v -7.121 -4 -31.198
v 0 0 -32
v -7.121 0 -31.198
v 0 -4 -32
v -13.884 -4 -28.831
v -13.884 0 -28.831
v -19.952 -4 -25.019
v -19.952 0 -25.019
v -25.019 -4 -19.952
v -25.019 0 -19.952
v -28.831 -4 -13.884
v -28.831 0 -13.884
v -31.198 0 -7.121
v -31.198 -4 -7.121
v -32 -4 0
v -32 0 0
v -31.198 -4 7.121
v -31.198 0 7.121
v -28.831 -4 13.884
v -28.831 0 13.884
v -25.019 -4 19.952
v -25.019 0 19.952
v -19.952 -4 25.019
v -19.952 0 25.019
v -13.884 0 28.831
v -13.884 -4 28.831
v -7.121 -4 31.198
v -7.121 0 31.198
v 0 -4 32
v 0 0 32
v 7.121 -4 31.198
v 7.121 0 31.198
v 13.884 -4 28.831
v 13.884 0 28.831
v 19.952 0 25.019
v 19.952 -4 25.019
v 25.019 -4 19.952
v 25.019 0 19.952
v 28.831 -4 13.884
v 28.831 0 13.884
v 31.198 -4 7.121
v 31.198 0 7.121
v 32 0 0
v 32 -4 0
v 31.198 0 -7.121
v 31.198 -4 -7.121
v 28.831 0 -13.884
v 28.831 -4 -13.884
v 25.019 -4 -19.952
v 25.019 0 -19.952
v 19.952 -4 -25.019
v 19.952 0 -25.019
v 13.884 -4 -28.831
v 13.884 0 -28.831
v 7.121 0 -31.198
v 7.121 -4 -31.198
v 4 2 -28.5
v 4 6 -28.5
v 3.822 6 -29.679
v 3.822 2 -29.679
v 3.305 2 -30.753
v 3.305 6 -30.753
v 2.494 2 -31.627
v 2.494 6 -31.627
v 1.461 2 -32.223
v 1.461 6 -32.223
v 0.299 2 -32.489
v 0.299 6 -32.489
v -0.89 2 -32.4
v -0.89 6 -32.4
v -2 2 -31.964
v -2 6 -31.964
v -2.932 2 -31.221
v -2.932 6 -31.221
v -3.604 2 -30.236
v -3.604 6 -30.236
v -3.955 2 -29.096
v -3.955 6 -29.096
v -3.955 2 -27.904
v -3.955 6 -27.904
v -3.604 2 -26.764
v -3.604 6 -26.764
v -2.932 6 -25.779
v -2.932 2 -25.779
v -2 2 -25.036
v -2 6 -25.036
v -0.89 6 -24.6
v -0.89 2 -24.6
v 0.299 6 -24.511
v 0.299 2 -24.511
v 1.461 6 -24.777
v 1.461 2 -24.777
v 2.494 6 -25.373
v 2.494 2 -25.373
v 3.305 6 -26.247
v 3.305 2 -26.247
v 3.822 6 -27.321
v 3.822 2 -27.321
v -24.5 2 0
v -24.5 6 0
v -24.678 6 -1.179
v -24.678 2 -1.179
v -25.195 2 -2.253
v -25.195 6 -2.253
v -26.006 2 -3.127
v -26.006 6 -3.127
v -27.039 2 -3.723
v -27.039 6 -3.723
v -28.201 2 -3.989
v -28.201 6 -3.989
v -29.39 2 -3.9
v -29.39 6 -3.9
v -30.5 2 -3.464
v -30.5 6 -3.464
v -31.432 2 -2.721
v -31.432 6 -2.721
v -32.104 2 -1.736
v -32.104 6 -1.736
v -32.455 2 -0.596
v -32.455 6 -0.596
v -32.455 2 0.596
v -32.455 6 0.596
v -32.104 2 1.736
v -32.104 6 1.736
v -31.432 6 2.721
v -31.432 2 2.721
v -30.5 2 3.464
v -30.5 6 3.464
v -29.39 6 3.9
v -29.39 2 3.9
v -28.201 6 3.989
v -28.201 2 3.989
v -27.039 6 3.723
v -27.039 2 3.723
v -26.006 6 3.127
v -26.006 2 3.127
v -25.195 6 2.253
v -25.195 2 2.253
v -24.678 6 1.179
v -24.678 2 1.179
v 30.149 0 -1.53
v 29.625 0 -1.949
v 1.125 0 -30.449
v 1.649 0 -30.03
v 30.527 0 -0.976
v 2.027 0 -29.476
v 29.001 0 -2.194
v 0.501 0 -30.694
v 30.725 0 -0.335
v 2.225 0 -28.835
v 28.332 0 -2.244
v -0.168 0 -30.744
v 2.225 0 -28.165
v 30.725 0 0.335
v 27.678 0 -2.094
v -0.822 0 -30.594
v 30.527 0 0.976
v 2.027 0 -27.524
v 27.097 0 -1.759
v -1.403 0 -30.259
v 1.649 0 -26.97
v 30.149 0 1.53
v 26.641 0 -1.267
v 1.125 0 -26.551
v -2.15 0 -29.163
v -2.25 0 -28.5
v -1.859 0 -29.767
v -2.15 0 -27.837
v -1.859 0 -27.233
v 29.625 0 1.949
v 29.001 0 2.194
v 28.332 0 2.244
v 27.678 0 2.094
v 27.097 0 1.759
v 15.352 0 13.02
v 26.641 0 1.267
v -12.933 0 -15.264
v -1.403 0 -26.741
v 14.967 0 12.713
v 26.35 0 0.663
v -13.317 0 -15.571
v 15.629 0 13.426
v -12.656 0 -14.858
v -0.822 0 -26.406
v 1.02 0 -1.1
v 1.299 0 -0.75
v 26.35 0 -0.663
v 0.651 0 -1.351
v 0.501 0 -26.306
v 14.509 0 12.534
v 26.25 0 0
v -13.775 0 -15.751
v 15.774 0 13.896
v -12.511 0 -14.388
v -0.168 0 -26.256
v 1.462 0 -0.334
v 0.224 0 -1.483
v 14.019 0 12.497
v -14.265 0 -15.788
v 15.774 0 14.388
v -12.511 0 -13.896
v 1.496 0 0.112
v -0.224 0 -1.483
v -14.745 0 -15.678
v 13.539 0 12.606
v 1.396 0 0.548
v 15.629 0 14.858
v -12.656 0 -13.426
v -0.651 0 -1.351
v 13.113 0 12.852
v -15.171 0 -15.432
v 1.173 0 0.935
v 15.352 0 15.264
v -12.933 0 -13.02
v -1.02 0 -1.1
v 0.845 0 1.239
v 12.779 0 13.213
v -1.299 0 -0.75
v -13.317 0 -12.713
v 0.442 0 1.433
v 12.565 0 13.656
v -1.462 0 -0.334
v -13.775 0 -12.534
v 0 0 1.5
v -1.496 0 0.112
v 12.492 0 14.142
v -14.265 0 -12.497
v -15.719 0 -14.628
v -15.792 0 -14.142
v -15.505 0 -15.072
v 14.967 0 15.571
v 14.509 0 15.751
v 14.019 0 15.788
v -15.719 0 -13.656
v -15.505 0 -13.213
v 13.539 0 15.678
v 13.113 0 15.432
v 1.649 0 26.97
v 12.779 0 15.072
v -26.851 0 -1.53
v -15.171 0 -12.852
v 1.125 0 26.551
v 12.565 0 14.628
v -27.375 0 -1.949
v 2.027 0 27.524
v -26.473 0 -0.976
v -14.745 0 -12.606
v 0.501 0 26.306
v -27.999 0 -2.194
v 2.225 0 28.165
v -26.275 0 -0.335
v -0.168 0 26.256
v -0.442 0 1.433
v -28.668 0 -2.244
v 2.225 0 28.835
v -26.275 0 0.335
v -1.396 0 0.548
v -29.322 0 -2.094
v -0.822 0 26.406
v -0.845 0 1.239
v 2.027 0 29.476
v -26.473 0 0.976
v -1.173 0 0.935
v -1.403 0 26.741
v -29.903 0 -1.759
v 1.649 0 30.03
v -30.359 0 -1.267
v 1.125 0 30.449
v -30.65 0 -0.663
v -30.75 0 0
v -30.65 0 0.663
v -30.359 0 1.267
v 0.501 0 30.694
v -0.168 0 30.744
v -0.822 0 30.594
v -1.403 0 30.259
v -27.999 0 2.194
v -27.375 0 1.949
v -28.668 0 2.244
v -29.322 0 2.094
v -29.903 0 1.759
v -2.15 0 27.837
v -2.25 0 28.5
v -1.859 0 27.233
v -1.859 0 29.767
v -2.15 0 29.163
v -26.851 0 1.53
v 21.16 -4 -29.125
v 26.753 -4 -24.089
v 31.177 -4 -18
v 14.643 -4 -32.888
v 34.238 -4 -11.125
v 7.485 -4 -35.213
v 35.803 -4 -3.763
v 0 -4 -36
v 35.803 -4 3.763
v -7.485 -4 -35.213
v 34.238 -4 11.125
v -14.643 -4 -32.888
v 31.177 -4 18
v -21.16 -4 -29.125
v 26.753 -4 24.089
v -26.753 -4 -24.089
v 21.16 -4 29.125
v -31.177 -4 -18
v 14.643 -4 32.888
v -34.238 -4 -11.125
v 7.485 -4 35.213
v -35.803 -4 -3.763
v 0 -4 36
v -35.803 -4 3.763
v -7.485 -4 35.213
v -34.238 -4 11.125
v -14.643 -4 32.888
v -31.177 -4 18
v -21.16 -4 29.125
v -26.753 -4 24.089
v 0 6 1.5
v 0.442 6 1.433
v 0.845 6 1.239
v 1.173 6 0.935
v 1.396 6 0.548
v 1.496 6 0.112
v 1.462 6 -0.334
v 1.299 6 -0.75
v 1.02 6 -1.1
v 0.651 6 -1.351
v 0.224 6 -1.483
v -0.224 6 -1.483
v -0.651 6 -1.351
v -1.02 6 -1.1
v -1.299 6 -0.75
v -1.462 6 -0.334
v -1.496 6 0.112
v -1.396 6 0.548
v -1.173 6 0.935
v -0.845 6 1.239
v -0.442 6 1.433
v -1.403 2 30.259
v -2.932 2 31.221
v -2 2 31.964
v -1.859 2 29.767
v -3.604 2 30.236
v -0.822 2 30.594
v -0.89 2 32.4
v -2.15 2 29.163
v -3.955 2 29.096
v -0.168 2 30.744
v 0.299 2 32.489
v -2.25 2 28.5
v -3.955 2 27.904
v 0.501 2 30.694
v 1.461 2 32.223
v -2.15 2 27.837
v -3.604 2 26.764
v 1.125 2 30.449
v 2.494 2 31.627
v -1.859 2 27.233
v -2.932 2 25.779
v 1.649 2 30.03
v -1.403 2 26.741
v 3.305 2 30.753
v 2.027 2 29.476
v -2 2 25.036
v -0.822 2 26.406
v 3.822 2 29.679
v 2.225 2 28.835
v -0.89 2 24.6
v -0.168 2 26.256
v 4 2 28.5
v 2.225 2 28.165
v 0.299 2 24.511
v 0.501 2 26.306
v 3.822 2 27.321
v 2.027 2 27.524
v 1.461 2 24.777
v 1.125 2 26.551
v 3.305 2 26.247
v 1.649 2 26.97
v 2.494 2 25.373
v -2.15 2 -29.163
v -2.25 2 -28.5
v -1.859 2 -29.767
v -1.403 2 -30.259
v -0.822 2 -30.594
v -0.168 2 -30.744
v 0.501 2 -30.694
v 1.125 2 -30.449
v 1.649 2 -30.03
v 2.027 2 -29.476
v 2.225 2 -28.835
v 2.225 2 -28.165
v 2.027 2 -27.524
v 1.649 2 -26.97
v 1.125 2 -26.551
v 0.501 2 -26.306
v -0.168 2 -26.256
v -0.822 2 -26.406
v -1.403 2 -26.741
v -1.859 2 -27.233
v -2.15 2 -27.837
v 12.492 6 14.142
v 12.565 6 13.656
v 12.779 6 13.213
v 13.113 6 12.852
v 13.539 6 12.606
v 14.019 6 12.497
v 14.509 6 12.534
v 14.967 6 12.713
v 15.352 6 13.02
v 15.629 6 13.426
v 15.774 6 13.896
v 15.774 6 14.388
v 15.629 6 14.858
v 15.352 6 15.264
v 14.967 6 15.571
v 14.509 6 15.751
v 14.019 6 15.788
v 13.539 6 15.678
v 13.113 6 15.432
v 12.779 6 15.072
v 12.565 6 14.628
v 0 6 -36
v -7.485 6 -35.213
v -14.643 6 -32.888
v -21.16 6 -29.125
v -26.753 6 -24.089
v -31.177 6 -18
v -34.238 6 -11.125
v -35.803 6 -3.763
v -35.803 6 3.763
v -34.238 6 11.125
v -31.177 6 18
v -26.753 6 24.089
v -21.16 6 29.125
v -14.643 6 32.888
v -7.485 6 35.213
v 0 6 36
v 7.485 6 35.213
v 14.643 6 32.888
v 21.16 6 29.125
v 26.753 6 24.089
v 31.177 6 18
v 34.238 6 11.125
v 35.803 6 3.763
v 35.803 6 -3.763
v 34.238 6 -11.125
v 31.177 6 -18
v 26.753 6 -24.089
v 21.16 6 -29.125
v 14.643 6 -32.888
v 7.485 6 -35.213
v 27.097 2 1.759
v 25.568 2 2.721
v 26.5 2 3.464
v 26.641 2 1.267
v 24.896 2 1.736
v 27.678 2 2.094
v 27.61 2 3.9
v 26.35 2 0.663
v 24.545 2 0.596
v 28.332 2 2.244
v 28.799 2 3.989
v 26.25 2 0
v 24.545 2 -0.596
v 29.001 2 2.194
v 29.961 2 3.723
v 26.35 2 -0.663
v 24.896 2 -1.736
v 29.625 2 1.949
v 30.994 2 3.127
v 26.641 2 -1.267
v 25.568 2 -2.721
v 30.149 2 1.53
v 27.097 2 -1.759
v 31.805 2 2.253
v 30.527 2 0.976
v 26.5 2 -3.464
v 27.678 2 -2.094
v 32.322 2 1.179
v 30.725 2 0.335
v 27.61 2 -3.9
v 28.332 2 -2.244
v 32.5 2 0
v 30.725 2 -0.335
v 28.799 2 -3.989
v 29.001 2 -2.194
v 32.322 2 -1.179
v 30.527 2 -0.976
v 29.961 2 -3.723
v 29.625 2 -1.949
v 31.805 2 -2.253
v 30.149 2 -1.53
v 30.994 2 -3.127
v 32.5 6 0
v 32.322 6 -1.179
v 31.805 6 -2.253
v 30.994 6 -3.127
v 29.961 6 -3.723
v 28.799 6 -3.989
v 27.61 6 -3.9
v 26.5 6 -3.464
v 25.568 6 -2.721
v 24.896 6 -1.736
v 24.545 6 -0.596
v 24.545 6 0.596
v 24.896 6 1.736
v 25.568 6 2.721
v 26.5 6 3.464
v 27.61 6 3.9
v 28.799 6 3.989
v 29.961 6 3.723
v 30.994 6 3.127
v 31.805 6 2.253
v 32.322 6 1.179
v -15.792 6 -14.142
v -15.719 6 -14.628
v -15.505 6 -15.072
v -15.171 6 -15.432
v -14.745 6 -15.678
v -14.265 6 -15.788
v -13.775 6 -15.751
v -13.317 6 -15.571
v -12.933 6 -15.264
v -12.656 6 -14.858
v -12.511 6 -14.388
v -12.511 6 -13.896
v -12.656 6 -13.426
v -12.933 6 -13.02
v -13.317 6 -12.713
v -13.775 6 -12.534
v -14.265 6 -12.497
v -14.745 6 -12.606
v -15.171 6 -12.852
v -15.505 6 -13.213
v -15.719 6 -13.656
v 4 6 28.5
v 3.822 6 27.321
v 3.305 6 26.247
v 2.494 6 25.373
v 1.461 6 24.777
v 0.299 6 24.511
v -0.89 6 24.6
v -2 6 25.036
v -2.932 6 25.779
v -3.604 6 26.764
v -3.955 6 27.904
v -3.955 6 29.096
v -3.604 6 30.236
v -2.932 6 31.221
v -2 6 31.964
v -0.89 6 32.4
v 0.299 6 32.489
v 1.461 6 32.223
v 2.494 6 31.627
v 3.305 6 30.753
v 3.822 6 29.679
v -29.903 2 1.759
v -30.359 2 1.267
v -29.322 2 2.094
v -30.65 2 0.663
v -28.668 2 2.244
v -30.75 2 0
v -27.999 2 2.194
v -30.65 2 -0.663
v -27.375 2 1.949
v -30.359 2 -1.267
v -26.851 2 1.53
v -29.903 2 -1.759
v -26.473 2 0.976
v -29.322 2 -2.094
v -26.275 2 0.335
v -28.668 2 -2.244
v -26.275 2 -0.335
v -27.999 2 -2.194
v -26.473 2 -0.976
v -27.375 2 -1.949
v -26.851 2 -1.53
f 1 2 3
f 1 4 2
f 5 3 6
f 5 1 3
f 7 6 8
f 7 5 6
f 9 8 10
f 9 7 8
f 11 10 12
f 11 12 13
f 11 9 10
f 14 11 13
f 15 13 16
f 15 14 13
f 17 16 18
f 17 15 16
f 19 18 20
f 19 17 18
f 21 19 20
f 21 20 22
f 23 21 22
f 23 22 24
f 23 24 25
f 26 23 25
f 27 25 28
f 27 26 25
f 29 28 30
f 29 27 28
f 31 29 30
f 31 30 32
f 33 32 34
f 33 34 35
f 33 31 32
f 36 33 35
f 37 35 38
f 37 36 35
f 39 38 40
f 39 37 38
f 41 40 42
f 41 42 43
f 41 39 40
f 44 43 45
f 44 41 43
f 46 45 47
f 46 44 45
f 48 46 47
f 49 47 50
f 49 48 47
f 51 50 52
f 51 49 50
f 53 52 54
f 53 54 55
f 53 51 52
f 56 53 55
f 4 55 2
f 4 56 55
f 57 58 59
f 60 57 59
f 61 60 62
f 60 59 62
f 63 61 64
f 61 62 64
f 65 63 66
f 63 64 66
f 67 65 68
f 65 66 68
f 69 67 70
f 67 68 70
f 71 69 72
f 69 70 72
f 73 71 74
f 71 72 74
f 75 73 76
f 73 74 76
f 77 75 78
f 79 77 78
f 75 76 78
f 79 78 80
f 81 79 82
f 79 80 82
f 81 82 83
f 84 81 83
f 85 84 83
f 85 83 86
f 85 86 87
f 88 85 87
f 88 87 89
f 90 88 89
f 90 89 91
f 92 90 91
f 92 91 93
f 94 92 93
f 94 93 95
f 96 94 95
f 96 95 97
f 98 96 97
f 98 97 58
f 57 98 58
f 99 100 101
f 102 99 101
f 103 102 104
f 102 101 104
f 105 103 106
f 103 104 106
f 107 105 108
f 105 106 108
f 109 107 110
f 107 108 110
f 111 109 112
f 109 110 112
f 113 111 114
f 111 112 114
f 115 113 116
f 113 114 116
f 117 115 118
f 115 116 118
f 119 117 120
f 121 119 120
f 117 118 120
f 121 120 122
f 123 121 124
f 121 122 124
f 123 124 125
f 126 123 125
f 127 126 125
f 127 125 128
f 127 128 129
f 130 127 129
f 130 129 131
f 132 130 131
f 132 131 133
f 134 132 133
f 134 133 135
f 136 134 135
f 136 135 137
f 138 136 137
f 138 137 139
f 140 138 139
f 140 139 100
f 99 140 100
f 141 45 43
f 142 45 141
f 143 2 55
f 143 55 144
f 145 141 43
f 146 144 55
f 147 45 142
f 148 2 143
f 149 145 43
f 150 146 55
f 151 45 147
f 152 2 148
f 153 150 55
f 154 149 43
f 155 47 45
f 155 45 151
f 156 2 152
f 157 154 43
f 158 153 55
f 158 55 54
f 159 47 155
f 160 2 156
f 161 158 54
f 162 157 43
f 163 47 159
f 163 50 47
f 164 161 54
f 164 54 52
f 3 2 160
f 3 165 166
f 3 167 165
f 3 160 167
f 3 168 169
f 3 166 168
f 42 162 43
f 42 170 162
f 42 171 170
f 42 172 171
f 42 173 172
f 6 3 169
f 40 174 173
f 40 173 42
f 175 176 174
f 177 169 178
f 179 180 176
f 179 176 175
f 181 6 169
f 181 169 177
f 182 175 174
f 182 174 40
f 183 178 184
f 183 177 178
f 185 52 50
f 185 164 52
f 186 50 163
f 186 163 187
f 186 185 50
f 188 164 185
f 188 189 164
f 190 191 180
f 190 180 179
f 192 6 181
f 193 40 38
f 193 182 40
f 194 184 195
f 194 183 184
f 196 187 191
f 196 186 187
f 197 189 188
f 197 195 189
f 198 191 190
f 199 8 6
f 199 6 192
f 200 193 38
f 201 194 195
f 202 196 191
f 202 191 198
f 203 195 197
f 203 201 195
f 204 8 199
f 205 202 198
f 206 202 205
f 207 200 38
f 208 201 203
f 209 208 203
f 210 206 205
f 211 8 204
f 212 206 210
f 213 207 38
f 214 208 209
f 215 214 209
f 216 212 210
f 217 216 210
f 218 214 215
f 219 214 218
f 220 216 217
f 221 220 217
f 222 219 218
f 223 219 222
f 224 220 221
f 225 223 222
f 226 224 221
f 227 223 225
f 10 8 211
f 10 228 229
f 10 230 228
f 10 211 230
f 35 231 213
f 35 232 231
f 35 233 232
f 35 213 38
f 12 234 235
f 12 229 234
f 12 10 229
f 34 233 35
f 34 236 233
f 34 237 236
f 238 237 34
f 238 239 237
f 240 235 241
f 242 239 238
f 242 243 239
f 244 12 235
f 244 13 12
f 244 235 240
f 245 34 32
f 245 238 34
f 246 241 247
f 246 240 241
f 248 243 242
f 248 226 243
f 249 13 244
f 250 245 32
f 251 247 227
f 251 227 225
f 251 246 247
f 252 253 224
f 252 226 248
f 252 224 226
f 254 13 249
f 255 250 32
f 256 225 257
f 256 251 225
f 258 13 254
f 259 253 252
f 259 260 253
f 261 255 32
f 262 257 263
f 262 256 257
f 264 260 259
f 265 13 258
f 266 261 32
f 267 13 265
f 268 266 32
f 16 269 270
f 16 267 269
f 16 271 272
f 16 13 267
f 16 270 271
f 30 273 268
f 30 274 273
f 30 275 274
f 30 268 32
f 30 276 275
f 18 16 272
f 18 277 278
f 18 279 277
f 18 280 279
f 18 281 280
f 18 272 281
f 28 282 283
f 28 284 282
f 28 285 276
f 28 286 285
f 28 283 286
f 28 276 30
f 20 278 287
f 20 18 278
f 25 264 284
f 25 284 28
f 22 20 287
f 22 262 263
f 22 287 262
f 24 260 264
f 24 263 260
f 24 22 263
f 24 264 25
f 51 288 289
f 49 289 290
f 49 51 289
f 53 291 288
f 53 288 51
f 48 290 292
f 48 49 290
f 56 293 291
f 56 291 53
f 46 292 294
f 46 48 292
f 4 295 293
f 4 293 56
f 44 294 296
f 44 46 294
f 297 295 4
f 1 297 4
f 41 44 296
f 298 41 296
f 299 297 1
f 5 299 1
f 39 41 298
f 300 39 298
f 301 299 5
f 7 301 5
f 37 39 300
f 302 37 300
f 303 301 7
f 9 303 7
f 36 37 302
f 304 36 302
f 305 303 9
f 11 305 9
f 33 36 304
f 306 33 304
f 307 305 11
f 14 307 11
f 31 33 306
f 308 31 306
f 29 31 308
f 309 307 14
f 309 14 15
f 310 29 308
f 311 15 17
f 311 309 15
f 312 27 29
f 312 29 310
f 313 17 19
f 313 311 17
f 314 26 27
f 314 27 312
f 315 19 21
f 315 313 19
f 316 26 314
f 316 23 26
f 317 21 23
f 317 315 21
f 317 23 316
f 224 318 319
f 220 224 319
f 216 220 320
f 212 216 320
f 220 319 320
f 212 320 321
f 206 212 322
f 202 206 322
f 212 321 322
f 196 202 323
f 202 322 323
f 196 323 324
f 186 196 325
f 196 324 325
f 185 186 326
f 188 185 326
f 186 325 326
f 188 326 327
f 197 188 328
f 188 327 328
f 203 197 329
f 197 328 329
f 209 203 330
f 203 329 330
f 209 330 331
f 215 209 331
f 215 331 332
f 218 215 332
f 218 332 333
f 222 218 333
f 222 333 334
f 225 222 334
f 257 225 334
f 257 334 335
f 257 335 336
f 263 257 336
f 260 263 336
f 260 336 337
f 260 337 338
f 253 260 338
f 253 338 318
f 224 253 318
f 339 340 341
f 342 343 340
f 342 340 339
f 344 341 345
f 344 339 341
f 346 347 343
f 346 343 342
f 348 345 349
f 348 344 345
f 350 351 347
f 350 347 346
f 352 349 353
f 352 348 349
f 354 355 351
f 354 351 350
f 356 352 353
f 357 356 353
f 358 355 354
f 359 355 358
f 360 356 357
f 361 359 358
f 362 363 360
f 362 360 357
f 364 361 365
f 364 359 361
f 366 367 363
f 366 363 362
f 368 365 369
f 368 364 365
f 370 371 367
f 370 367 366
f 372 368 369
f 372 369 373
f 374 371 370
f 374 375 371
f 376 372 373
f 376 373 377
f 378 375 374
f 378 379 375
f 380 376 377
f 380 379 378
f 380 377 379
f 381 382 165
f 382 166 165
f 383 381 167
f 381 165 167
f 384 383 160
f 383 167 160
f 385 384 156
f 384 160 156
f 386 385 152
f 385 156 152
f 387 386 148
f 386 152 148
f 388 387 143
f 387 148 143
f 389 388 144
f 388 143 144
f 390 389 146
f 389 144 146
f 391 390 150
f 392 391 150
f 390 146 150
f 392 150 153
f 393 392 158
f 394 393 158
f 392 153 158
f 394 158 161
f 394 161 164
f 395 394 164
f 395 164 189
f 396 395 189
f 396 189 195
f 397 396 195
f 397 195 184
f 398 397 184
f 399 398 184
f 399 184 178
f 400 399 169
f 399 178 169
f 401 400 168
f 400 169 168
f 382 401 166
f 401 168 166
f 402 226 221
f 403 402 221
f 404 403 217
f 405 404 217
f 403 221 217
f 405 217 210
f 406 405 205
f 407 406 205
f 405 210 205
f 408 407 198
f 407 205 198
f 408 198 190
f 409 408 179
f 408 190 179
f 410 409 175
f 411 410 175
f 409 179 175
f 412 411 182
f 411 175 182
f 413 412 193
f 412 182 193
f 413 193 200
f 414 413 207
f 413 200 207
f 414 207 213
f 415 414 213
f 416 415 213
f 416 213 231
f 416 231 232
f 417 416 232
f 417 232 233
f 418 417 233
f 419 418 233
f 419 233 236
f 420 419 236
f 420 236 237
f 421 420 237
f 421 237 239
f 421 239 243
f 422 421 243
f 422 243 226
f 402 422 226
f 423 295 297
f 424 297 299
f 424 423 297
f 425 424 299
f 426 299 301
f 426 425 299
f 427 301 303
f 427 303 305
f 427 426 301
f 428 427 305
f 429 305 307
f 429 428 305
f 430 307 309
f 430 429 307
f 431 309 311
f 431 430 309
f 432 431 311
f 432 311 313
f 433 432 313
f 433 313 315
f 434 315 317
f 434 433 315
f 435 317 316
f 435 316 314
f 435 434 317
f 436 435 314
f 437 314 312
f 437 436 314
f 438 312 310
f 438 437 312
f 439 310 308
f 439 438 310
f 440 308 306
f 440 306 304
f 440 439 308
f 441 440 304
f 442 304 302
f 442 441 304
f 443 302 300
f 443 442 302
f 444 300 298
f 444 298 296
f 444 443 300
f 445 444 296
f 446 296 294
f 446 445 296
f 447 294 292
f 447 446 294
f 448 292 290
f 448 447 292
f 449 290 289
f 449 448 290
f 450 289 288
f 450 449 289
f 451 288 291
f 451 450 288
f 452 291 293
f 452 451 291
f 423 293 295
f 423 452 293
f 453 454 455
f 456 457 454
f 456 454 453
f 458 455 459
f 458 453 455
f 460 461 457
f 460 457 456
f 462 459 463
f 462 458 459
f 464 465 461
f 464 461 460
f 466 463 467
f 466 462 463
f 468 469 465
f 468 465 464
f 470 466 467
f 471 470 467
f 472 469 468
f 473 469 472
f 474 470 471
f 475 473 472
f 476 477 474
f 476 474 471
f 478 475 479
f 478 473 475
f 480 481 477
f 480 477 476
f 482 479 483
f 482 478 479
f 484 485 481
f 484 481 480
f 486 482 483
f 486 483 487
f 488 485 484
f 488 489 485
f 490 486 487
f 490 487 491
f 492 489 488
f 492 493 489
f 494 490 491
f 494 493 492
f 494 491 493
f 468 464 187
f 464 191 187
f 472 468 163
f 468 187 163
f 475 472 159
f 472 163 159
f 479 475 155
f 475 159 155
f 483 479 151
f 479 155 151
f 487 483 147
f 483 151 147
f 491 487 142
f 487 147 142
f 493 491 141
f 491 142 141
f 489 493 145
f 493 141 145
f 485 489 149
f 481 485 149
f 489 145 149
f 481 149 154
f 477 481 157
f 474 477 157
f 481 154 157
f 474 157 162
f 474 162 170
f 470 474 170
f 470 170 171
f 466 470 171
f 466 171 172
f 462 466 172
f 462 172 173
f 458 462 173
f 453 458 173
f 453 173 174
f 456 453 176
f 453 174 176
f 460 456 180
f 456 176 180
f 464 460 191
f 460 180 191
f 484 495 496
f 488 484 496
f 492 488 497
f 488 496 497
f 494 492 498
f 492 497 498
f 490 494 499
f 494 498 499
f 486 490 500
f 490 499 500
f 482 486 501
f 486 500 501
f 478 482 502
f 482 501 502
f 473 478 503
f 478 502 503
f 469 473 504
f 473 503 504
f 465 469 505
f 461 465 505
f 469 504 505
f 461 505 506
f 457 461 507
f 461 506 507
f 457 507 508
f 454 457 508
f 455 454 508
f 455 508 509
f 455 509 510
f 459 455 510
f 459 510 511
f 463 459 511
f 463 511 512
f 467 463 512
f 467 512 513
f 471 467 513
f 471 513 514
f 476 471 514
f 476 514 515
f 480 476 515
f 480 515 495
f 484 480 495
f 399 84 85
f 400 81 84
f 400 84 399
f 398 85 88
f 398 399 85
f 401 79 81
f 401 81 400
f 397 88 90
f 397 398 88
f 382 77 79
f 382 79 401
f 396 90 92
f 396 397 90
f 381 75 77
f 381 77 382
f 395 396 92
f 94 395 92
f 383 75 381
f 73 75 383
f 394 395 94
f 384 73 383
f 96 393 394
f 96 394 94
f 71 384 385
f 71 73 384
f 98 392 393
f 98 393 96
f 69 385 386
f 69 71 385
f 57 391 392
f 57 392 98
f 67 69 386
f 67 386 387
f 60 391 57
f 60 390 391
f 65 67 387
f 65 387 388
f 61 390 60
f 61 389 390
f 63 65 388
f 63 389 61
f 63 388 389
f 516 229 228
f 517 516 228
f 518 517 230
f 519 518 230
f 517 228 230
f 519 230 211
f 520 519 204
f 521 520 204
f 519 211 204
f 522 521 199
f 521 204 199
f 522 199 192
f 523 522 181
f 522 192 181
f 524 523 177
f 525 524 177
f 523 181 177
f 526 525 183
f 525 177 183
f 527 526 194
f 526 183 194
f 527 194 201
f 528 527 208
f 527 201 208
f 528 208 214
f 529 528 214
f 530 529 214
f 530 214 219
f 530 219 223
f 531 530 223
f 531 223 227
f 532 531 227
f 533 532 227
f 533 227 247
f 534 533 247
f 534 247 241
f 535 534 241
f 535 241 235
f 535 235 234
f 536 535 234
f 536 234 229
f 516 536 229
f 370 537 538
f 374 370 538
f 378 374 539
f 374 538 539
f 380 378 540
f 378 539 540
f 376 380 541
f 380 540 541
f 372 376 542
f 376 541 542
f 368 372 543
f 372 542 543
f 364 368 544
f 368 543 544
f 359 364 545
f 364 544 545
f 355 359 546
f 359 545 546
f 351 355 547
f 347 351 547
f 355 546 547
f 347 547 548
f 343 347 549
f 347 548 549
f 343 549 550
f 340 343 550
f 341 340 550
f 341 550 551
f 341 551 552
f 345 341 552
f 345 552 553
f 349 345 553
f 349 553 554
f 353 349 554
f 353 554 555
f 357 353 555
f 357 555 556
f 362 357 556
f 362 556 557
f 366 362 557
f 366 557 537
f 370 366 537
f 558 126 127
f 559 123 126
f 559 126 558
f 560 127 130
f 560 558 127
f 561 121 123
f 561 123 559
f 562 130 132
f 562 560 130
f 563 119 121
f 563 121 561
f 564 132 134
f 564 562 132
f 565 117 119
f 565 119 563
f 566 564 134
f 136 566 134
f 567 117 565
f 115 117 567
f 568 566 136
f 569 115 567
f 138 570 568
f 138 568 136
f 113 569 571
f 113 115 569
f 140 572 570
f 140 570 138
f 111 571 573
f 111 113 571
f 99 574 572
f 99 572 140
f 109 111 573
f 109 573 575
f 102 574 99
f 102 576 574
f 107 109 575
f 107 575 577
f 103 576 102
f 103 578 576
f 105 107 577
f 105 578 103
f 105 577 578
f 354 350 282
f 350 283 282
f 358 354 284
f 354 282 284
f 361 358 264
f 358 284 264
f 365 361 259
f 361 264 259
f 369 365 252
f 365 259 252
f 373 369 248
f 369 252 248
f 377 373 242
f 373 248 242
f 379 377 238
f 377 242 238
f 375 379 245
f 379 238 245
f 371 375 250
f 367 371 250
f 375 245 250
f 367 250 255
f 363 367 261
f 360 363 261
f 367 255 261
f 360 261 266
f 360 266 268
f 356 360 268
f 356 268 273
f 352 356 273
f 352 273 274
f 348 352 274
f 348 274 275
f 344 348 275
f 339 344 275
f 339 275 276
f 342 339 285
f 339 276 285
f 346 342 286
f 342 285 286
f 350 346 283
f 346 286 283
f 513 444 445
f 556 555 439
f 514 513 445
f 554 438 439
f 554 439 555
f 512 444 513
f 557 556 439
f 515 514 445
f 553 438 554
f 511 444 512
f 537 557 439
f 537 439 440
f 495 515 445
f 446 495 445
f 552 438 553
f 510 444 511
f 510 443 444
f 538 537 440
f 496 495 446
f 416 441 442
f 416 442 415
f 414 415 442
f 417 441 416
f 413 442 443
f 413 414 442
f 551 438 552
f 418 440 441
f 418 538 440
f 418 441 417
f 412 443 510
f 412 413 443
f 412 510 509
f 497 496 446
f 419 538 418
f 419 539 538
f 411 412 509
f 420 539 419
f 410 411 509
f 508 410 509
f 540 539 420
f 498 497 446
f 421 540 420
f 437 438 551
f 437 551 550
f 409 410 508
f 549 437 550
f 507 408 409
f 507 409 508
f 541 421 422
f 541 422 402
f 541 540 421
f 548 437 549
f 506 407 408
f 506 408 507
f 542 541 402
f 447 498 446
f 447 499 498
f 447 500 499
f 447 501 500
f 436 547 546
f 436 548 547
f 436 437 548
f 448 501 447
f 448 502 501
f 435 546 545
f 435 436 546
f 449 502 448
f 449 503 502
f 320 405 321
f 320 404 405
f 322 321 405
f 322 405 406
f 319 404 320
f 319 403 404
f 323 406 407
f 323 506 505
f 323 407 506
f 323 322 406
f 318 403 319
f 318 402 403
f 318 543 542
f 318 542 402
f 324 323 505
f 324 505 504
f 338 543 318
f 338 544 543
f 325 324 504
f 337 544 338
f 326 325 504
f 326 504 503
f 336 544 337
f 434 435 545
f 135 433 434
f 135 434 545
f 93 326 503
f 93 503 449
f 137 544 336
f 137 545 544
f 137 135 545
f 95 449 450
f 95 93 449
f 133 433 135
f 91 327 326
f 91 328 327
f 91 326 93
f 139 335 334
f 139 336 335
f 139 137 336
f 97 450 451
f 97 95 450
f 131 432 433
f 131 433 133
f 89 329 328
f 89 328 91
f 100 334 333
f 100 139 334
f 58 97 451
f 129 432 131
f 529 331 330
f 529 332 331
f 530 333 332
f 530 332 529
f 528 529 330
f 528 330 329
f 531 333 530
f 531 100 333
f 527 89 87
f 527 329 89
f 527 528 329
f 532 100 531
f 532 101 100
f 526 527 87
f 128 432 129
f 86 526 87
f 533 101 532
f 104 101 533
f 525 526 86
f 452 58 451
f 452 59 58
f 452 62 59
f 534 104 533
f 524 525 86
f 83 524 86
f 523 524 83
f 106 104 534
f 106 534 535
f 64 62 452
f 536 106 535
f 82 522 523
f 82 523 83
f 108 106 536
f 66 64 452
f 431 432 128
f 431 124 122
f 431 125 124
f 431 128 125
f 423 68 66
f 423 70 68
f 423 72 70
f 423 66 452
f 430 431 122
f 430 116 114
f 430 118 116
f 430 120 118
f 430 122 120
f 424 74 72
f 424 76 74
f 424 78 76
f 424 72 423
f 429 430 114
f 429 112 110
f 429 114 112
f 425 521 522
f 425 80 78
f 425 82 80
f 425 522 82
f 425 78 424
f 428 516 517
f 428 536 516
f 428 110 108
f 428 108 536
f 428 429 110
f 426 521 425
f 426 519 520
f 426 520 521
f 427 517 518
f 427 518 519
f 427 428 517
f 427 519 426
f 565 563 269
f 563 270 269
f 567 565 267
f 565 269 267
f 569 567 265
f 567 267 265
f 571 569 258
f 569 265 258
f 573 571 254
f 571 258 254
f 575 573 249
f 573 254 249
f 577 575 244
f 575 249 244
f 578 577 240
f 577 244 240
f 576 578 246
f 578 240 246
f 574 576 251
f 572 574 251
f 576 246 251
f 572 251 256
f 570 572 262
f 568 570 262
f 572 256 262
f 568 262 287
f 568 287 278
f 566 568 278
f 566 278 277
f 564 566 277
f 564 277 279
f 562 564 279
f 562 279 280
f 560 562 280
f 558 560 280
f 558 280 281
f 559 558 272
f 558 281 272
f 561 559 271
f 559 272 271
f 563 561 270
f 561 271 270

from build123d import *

# Parameters (mm, degrees)
CBORE_FOR_M4_SHCS1_D           = 4.5
CBORE_FOR_M4_SHCS1_CBORE_D     = 8
CBORE_FOR_M4_SHCS1_CBORE_DEPTH = 4
M4X0_7_TAPPED_HOLE1_D          = 3.3
M4X0_7_TAPPED_HOLE1_DEPTH      = 8.1
M4X0_7_TAPPED_HOLE1_TIP        = 0.991420021
SKETCH7_R                      = 1.5
CUT_EXTRUDE1_DEPTH             = 52.884487084


with BuildPart() as part:
    # Sketch2 → Revolve1 (revolve)
    with BuildSketch(Plane.XY, mode=Mode.PRIVATE) as revolve1_sk:
        Polygon((0, 0), (32, 0), (32, -4), (36, -4), (36, 6), (0, 6), align=None)
    revolve(revolve1_sk.sketch.rotate(Axis((0, -990.217396251, 0), (0, 1, 0)), 90), axis=Axis((0, -990.217396251, 0), (0, 1, 0)))

    # CBORE for M4 SHCS1 (through all)
    with Locations(Plane(origin=(0, 6, 0), x_dir=(1, 0, 0), z_dir=(0, 1, 0))):
        with Locations((0, 28.5), (-28.5, 0), (28.5, 0), (0, -28.5)):
            CounterBoreHole(CBORE_FOR_M4_SHCS1_D / 2, CBORE_FOR_M4_SHCS1_CBORE_D / 2, CBORE_FOR_M4_SHCS1_CBORE_DEPTH)

    # M4x0.7 Tapped Hole1
    with Locations(Plane(origin=(0, 6, 0), x_dir=(1, 0, 0), z_dir=(0, 1, 0))):
        with Locations((-14.142135624, 14.142135624), (14.142135624, -14.142135624)):
            Hole(M4X0_7_TAPPED_HOLE1_D / 2, depth=M4X0_7_TAPPED_HOLE1_DEPTH)
            with Locations((0, 0, -(M4X0_7_TAPPED_HOLE1_DEPTH + M4X0_7_TAPPED_HOLE1_TIP / 2))):  # 118° drill point
                Cone(0, M4X0_7_TAPPED_HOLE1_D / 2, M4X0_7_TAPPED_HOLE1_TIP, mode=Mode.SUBTRACT)

    # Sketch7 → Cut-Extrude1 (cut, through all)
    with BuildSketch(Plane(origin=(0, 6, 0), x_dir=(1, 0, 0), z_dir=(0, 1, 0))):
        with Locations(Location((0, 0, 0), (0, 0, 270))):
            Circle(SKETCH7_R)
    extrude(amount=-CUT_EXTRUDE1_DEPTH, mode=Mode.SUBTRACT)


solid = part.part
